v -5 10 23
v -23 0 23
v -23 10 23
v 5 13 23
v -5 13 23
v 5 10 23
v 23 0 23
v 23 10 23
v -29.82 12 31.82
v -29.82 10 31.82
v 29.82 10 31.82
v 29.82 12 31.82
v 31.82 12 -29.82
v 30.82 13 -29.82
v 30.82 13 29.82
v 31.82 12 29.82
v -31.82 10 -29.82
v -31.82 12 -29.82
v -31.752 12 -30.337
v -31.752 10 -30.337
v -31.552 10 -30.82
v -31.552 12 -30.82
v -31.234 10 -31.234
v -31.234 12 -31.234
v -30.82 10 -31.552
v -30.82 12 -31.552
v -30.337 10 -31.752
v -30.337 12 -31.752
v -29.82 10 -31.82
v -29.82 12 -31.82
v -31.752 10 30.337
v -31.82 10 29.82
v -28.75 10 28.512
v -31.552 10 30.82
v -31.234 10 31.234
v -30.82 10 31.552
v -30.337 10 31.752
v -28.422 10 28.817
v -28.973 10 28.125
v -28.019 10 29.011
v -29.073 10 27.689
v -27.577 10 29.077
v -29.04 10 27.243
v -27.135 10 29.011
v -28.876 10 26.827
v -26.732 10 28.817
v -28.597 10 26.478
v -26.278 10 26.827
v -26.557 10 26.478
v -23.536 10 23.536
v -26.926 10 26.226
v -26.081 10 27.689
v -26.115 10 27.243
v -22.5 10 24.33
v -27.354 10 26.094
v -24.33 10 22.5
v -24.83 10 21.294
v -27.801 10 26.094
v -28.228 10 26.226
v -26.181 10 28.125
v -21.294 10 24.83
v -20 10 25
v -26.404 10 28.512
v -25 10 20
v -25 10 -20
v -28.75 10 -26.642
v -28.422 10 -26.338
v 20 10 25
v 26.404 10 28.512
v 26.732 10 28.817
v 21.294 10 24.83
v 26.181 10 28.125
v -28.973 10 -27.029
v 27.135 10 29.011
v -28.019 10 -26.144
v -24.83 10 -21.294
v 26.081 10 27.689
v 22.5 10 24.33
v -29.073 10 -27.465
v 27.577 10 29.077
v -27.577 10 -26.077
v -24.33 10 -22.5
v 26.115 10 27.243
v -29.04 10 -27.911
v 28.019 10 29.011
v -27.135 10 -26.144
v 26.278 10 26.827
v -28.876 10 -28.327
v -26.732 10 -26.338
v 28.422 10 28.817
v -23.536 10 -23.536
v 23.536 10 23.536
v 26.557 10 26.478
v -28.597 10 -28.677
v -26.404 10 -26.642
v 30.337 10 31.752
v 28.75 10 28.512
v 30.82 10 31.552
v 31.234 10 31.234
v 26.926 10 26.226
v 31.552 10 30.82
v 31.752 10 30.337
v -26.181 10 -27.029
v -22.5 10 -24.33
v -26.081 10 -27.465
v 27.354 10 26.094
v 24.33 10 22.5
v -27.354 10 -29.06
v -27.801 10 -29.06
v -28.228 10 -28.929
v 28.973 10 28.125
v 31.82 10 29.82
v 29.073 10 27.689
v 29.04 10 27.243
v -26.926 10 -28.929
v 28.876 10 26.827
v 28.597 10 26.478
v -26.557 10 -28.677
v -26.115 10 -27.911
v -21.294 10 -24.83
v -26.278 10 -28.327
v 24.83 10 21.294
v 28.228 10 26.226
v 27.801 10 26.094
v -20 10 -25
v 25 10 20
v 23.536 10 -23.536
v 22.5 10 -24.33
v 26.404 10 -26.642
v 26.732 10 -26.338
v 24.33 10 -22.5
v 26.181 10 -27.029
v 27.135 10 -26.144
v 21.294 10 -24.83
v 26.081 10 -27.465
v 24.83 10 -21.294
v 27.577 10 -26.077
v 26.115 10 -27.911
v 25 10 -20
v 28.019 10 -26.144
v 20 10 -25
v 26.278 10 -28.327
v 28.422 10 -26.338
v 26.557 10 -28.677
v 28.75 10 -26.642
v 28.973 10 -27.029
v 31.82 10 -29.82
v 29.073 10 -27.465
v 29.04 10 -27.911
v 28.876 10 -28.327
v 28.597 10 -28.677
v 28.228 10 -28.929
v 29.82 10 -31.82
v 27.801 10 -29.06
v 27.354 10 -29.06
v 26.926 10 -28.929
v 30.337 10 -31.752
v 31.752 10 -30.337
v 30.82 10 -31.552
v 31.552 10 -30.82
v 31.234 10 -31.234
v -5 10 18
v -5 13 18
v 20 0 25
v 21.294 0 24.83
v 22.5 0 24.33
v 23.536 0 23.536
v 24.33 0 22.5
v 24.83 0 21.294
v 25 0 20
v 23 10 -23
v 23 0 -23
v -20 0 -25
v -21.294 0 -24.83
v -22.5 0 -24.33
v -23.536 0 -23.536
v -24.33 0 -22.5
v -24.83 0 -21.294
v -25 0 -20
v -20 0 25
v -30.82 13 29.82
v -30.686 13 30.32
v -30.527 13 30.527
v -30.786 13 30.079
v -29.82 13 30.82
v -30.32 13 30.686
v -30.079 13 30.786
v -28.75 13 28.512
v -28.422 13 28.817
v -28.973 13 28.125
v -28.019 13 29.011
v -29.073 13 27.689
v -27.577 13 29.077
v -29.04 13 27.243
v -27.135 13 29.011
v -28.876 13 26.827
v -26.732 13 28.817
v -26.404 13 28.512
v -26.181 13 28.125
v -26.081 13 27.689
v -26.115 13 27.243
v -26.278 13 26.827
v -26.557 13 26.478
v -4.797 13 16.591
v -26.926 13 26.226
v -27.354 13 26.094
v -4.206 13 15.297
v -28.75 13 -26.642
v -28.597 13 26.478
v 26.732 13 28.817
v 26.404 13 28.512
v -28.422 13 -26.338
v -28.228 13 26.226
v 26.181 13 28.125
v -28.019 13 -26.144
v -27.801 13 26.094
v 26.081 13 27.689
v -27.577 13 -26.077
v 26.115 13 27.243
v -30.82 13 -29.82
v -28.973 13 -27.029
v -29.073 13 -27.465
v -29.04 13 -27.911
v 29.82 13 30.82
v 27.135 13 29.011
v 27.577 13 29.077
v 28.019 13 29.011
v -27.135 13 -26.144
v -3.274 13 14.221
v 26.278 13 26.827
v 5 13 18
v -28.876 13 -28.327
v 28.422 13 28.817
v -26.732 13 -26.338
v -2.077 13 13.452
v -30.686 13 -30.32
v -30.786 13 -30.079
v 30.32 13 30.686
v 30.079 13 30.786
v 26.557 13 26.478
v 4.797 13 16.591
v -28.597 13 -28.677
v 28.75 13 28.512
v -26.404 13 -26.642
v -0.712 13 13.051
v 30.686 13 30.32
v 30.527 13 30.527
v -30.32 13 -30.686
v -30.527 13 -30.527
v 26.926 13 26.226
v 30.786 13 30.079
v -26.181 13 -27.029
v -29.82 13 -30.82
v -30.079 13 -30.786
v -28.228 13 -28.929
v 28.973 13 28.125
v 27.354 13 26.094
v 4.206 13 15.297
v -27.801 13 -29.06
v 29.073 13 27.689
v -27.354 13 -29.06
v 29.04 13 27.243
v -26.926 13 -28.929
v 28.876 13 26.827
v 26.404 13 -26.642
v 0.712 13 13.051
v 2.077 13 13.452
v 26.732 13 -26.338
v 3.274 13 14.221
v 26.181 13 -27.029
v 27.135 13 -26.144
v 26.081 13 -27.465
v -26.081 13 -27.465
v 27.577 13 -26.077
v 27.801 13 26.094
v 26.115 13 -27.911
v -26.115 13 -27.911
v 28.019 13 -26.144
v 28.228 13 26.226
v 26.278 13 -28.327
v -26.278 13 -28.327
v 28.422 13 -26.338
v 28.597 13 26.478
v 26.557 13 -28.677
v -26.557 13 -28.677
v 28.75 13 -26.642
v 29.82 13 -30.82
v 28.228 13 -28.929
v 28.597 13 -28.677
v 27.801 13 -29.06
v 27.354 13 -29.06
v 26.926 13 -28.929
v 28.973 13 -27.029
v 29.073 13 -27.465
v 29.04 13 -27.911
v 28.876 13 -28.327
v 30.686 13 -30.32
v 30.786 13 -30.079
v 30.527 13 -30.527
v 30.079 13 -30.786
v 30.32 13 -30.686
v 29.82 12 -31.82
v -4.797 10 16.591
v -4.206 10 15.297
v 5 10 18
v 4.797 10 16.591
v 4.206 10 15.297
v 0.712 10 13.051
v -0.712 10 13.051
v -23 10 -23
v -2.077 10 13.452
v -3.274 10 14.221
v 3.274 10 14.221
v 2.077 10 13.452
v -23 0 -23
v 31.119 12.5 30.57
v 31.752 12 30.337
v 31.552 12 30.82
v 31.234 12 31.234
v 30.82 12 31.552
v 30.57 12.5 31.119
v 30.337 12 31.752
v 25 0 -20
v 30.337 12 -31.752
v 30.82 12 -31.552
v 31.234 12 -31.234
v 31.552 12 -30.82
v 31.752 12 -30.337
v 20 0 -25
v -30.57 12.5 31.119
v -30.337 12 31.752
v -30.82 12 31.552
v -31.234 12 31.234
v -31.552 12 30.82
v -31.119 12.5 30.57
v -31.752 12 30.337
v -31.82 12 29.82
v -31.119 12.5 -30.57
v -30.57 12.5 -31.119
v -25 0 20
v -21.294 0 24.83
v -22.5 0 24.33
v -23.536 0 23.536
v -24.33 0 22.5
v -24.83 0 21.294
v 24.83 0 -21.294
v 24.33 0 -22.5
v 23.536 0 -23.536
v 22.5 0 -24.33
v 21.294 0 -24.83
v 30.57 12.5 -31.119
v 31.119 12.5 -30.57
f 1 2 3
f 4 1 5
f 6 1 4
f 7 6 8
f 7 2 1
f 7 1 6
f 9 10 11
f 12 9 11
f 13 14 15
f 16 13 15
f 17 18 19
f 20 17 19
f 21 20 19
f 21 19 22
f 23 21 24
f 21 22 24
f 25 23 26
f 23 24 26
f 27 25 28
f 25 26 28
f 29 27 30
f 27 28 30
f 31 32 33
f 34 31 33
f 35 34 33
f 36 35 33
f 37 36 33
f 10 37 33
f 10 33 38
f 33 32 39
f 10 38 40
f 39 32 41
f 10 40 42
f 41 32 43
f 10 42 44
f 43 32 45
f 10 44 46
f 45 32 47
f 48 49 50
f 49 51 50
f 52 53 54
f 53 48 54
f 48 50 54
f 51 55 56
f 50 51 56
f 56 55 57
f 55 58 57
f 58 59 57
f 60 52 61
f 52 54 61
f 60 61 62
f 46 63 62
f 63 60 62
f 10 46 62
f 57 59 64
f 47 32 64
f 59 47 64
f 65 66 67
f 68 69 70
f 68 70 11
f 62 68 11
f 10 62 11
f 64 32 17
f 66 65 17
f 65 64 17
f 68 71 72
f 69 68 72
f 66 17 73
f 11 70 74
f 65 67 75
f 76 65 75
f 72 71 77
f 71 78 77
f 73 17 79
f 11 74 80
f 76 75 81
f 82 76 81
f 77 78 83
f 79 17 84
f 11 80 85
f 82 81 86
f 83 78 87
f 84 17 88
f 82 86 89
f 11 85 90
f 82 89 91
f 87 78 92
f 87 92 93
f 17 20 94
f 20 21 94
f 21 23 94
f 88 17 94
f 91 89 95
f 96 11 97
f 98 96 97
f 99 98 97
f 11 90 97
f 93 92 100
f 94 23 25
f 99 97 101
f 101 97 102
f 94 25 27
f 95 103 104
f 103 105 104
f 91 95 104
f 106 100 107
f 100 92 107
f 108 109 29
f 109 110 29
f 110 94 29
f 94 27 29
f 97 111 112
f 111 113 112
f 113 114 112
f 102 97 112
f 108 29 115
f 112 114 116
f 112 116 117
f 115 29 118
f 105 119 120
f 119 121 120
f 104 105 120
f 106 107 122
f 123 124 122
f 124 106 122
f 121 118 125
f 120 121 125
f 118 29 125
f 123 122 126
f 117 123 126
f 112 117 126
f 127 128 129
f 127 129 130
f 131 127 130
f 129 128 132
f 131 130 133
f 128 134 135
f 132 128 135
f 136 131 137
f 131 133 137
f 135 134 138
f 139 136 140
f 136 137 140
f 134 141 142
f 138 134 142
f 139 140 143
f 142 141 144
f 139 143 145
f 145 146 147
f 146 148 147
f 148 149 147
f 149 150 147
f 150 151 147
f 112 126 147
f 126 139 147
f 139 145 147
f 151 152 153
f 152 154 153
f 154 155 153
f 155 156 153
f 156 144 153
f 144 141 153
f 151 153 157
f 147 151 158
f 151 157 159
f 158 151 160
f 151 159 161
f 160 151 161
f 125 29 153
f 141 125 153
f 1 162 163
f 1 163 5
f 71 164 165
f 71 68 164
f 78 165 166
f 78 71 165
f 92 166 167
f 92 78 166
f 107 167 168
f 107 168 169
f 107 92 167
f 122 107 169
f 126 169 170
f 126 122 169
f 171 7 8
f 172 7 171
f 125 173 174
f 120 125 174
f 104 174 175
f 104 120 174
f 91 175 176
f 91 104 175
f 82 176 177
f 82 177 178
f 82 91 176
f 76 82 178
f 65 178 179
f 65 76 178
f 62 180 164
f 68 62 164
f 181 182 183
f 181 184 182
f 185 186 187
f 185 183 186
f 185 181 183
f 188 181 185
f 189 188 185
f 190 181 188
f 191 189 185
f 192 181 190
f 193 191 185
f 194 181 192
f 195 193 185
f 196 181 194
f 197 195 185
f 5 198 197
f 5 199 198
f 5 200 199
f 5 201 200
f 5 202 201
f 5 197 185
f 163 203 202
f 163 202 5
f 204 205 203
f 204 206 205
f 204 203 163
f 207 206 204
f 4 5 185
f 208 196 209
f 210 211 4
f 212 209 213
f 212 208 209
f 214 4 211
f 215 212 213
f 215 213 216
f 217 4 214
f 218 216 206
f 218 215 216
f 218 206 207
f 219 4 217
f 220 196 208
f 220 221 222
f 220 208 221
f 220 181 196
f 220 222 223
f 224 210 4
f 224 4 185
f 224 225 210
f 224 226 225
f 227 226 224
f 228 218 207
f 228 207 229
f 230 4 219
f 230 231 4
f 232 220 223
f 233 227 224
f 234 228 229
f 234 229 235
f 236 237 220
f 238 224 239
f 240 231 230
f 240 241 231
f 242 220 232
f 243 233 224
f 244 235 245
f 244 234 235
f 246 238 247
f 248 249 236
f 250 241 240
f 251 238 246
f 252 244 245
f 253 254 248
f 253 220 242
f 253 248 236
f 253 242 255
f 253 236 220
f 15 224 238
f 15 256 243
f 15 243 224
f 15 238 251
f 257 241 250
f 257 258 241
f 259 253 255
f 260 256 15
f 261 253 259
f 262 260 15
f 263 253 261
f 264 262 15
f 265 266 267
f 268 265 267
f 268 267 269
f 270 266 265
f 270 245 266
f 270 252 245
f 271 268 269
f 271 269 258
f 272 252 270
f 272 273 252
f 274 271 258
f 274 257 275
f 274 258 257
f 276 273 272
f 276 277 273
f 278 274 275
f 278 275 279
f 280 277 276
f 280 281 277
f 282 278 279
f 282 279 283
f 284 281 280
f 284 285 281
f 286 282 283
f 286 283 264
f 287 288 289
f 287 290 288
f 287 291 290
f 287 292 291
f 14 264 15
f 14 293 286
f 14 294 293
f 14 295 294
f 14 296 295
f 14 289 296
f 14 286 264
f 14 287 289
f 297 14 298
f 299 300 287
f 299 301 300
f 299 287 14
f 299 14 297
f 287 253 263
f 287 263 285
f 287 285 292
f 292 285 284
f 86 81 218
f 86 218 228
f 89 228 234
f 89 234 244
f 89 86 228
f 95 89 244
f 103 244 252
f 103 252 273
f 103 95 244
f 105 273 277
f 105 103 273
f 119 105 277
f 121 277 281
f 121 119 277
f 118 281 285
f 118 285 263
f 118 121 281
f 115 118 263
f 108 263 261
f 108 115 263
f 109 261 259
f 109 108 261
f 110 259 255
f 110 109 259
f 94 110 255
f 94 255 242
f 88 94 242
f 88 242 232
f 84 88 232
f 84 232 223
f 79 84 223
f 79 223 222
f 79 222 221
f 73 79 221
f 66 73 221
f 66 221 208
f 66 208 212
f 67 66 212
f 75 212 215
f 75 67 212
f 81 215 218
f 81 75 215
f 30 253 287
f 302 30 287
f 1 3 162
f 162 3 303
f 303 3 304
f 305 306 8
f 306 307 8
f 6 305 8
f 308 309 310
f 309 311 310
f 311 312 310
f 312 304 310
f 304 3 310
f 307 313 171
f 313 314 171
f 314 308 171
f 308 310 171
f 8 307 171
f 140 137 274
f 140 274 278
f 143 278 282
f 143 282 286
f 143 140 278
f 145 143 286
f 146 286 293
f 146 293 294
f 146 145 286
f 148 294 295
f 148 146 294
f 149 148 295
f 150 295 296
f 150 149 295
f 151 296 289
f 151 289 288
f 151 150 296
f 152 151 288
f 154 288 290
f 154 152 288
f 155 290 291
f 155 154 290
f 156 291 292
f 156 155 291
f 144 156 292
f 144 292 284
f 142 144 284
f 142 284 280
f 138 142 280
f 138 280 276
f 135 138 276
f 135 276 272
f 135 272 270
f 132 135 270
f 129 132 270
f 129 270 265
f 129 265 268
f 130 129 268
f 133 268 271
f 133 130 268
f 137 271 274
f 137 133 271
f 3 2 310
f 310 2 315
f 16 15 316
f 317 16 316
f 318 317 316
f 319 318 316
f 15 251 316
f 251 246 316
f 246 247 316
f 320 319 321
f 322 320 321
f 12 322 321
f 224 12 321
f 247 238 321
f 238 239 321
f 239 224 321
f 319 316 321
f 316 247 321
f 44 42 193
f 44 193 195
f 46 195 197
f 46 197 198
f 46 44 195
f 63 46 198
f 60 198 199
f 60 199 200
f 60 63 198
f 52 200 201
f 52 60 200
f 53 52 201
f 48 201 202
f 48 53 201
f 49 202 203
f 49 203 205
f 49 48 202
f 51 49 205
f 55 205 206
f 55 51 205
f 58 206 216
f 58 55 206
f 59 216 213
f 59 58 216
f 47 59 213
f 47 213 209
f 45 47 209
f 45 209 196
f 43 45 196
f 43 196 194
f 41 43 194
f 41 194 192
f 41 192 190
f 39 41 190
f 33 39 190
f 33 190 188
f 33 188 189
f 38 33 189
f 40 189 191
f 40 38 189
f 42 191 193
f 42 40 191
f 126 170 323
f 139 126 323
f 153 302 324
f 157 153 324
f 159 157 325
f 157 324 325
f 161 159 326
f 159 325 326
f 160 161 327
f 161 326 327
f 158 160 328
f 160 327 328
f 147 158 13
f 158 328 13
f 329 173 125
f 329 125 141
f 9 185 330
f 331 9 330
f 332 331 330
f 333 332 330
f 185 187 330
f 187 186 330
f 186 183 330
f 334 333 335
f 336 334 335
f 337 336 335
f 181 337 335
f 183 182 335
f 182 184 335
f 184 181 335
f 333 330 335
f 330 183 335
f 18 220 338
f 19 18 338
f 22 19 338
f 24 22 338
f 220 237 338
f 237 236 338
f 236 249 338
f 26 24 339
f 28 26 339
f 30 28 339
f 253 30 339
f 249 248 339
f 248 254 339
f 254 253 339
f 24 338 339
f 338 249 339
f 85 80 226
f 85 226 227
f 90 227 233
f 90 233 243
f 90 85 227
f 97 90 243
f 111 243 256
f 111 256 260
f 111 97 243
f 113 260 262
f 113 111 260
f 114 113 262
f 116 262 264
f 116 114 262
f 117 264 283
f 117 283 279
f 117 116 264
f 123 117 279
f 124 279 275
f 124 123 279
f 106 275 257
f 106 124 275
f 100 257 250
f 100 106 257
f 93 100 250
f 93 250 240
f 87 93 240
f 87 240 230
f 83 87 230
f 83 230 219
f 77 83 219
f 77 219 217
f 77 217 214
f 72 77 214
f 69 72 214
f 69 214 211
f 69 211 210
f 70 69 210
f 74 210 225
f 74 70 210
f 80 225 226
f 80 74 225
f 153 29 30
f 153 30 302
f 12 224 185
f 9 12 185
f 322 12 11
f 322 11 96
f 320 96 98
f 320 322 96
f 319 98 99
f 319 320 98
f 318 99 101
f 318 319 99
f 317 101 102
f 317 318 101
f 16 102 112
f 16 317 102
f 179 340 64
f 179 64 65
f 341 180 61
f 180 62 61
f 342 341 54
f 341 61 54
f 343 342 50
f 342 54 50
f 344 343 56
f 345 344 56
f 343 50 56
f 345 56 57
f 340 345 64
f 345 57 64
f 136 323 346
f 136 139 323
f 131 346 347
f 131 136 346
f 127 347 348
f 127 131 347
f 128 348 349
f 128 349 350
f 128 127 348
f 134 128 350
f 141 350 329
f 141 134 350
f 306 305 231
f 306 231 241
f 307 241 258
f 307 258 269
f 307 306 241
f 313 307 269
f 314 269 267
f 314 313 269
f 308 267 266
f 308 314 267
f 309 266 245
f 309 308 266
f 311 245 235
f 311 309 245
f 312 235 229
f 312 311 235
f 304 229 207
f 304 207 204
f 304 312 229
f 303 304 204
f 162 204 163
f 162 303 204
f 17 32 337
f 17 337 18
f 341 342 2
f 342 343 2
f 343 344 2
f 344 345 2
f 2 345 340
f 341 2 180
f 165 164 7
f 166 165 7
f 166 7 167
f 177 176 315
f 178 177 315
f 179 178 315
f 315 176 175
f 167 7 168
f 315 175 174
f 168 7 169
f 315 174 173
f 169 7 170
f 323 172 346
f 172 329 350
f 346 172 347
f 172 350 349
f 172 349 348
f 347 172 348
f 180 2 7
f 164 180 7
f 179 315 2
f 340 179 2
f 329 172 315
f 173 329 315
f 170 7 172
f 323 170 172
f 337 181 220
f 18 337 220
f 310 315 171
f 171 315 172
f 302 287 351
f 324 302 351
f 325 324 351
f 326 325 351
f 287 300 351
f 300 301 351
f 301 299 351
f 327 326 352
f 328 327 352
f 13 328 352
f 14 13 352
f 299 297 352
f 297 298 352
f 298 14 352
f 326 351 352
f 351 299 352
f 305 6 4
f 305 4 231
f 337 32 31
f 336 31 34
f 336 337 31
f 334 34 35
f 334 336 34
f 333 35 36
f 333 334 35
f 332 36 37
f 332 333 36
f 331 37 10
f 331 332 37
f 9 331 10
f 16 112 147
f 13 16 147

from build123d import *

# Parameters (mm, degrees)
SKETCH1_W           = 50
SKETCH1_H           = 50
SKETCH1_W_2         = 46
SKETCH1_H_2         = 46
BOSS_EXTRUDE1_DEPTH = 10
SKETCH2_W           = 63.639610306
SKETCH2_H           = 63.639610306
SKETCH2_R           = 1.5
BOSS_EXTRUDE2_DEPTH = 3
FILLET2_R           = 5
FILLET3_R           = 2
CHAMFER2_SIZE       = 1


with BuildPart() as part:
    # Sketch1 → Boss-Extrude1 (new body)
    with BuildSketch(Plane(origin=(0, 0, 0), x_dir=(1, 0, 0), z_dir=(0, 1, 0))):
        Rectangle(SKETCH1_W, SKETCH1_H)
        Rectangle(SKETCH1_W_2, SKETCH1_H_2, mode=Mode.SUBTRACT)
    extrude(amount=BOSS_EXTRUDE1_DEPTH)

    # Sketch2 → Boss-Extrude2 (add)
    with BuildSketch(Plane(origin=(0, 10, 0), x_dir=(1, 0, 0), z_dir=(0, 1, 0))):
        Rectangle(SKETCH2_W, SKETCH2_H)
        with Locations(Location((-27.577164466, 27.577164466, 0), (0, 0, 270))):
            Circle(SKETCH2_R, mode=Mode.SUBTRACT)
        with Locations(Location((27.577164466, 27.577164466, 0), (0, 0, 270))):
            Circle(SKETCH2_R, mode=Mode.SUBTRACT)
        with Locations(Location((-27.577164466, -27.577164466, 0), (0, 0, 270))):
            Circle(SKETCH2_R, mode=Mode.SUBTRACT)
        with Locations(Location((27.577164466, -27.577164466, 0), (0, 0, 270))):
            Circle(SKETCH2_R, mode=Mode.SUBTRACT)
        with BuildLine():
            Line((-5, -23), (5, -23))
            Line((5, -23), (5, -18))
            ThreePointArc((5, -18), (0, -13), (-5, -18))
            Line((-5, -18), (-5, -23))
        make_face(mode=Mode.SUBTRACT)
    extrude(amount=BOSS_EXTRUDE2_DEPTH)

    # Fillet2
    fillet2_edges = [part.edges().sort_by_distance(p)[0] for p in [
        (-25, 5, -25),
        (25, 5, -25),
        (25, 5, 25),
        (-25, 5, 25),
    ]]
    fillet(fillet2_edges, radius=FILLET2_R)

    # Fillet3
    fillet3_edges = [part.edges().sort_by_distance(p)[0] for p in [
        (31.819805153, 11.5, 31.819805153),
        (31.819805153, 11.5, -31.819805153),
        (-31.819805153, 11.5, -31.819805153),
        (-31.819805153, 11.5, 31.819805153),
    ]]
    fillet(fillet3_edges, radius=FILLET3_R)

    # Chamfer2
    chamfer2_edges = [part.edges().sort_by_distance(p)[0] for p in [
        (31.234018716, 13, -31.234018716),
        (0, 13, -31.819805153),
        (31.819805153, 13, 0),
        (-31.819805153, 13, 0),
        (0, 13, 31.819805153),
        (31.234018716, 13, 31.234018716),
        (-31.234018716, 13, 31.234018716),
        (-31.234018716, 13, -31.234018716),
    ]]
    chamfer(chamfer2_edges, length=CHAMFER2_SIZE)


solid = part.part
